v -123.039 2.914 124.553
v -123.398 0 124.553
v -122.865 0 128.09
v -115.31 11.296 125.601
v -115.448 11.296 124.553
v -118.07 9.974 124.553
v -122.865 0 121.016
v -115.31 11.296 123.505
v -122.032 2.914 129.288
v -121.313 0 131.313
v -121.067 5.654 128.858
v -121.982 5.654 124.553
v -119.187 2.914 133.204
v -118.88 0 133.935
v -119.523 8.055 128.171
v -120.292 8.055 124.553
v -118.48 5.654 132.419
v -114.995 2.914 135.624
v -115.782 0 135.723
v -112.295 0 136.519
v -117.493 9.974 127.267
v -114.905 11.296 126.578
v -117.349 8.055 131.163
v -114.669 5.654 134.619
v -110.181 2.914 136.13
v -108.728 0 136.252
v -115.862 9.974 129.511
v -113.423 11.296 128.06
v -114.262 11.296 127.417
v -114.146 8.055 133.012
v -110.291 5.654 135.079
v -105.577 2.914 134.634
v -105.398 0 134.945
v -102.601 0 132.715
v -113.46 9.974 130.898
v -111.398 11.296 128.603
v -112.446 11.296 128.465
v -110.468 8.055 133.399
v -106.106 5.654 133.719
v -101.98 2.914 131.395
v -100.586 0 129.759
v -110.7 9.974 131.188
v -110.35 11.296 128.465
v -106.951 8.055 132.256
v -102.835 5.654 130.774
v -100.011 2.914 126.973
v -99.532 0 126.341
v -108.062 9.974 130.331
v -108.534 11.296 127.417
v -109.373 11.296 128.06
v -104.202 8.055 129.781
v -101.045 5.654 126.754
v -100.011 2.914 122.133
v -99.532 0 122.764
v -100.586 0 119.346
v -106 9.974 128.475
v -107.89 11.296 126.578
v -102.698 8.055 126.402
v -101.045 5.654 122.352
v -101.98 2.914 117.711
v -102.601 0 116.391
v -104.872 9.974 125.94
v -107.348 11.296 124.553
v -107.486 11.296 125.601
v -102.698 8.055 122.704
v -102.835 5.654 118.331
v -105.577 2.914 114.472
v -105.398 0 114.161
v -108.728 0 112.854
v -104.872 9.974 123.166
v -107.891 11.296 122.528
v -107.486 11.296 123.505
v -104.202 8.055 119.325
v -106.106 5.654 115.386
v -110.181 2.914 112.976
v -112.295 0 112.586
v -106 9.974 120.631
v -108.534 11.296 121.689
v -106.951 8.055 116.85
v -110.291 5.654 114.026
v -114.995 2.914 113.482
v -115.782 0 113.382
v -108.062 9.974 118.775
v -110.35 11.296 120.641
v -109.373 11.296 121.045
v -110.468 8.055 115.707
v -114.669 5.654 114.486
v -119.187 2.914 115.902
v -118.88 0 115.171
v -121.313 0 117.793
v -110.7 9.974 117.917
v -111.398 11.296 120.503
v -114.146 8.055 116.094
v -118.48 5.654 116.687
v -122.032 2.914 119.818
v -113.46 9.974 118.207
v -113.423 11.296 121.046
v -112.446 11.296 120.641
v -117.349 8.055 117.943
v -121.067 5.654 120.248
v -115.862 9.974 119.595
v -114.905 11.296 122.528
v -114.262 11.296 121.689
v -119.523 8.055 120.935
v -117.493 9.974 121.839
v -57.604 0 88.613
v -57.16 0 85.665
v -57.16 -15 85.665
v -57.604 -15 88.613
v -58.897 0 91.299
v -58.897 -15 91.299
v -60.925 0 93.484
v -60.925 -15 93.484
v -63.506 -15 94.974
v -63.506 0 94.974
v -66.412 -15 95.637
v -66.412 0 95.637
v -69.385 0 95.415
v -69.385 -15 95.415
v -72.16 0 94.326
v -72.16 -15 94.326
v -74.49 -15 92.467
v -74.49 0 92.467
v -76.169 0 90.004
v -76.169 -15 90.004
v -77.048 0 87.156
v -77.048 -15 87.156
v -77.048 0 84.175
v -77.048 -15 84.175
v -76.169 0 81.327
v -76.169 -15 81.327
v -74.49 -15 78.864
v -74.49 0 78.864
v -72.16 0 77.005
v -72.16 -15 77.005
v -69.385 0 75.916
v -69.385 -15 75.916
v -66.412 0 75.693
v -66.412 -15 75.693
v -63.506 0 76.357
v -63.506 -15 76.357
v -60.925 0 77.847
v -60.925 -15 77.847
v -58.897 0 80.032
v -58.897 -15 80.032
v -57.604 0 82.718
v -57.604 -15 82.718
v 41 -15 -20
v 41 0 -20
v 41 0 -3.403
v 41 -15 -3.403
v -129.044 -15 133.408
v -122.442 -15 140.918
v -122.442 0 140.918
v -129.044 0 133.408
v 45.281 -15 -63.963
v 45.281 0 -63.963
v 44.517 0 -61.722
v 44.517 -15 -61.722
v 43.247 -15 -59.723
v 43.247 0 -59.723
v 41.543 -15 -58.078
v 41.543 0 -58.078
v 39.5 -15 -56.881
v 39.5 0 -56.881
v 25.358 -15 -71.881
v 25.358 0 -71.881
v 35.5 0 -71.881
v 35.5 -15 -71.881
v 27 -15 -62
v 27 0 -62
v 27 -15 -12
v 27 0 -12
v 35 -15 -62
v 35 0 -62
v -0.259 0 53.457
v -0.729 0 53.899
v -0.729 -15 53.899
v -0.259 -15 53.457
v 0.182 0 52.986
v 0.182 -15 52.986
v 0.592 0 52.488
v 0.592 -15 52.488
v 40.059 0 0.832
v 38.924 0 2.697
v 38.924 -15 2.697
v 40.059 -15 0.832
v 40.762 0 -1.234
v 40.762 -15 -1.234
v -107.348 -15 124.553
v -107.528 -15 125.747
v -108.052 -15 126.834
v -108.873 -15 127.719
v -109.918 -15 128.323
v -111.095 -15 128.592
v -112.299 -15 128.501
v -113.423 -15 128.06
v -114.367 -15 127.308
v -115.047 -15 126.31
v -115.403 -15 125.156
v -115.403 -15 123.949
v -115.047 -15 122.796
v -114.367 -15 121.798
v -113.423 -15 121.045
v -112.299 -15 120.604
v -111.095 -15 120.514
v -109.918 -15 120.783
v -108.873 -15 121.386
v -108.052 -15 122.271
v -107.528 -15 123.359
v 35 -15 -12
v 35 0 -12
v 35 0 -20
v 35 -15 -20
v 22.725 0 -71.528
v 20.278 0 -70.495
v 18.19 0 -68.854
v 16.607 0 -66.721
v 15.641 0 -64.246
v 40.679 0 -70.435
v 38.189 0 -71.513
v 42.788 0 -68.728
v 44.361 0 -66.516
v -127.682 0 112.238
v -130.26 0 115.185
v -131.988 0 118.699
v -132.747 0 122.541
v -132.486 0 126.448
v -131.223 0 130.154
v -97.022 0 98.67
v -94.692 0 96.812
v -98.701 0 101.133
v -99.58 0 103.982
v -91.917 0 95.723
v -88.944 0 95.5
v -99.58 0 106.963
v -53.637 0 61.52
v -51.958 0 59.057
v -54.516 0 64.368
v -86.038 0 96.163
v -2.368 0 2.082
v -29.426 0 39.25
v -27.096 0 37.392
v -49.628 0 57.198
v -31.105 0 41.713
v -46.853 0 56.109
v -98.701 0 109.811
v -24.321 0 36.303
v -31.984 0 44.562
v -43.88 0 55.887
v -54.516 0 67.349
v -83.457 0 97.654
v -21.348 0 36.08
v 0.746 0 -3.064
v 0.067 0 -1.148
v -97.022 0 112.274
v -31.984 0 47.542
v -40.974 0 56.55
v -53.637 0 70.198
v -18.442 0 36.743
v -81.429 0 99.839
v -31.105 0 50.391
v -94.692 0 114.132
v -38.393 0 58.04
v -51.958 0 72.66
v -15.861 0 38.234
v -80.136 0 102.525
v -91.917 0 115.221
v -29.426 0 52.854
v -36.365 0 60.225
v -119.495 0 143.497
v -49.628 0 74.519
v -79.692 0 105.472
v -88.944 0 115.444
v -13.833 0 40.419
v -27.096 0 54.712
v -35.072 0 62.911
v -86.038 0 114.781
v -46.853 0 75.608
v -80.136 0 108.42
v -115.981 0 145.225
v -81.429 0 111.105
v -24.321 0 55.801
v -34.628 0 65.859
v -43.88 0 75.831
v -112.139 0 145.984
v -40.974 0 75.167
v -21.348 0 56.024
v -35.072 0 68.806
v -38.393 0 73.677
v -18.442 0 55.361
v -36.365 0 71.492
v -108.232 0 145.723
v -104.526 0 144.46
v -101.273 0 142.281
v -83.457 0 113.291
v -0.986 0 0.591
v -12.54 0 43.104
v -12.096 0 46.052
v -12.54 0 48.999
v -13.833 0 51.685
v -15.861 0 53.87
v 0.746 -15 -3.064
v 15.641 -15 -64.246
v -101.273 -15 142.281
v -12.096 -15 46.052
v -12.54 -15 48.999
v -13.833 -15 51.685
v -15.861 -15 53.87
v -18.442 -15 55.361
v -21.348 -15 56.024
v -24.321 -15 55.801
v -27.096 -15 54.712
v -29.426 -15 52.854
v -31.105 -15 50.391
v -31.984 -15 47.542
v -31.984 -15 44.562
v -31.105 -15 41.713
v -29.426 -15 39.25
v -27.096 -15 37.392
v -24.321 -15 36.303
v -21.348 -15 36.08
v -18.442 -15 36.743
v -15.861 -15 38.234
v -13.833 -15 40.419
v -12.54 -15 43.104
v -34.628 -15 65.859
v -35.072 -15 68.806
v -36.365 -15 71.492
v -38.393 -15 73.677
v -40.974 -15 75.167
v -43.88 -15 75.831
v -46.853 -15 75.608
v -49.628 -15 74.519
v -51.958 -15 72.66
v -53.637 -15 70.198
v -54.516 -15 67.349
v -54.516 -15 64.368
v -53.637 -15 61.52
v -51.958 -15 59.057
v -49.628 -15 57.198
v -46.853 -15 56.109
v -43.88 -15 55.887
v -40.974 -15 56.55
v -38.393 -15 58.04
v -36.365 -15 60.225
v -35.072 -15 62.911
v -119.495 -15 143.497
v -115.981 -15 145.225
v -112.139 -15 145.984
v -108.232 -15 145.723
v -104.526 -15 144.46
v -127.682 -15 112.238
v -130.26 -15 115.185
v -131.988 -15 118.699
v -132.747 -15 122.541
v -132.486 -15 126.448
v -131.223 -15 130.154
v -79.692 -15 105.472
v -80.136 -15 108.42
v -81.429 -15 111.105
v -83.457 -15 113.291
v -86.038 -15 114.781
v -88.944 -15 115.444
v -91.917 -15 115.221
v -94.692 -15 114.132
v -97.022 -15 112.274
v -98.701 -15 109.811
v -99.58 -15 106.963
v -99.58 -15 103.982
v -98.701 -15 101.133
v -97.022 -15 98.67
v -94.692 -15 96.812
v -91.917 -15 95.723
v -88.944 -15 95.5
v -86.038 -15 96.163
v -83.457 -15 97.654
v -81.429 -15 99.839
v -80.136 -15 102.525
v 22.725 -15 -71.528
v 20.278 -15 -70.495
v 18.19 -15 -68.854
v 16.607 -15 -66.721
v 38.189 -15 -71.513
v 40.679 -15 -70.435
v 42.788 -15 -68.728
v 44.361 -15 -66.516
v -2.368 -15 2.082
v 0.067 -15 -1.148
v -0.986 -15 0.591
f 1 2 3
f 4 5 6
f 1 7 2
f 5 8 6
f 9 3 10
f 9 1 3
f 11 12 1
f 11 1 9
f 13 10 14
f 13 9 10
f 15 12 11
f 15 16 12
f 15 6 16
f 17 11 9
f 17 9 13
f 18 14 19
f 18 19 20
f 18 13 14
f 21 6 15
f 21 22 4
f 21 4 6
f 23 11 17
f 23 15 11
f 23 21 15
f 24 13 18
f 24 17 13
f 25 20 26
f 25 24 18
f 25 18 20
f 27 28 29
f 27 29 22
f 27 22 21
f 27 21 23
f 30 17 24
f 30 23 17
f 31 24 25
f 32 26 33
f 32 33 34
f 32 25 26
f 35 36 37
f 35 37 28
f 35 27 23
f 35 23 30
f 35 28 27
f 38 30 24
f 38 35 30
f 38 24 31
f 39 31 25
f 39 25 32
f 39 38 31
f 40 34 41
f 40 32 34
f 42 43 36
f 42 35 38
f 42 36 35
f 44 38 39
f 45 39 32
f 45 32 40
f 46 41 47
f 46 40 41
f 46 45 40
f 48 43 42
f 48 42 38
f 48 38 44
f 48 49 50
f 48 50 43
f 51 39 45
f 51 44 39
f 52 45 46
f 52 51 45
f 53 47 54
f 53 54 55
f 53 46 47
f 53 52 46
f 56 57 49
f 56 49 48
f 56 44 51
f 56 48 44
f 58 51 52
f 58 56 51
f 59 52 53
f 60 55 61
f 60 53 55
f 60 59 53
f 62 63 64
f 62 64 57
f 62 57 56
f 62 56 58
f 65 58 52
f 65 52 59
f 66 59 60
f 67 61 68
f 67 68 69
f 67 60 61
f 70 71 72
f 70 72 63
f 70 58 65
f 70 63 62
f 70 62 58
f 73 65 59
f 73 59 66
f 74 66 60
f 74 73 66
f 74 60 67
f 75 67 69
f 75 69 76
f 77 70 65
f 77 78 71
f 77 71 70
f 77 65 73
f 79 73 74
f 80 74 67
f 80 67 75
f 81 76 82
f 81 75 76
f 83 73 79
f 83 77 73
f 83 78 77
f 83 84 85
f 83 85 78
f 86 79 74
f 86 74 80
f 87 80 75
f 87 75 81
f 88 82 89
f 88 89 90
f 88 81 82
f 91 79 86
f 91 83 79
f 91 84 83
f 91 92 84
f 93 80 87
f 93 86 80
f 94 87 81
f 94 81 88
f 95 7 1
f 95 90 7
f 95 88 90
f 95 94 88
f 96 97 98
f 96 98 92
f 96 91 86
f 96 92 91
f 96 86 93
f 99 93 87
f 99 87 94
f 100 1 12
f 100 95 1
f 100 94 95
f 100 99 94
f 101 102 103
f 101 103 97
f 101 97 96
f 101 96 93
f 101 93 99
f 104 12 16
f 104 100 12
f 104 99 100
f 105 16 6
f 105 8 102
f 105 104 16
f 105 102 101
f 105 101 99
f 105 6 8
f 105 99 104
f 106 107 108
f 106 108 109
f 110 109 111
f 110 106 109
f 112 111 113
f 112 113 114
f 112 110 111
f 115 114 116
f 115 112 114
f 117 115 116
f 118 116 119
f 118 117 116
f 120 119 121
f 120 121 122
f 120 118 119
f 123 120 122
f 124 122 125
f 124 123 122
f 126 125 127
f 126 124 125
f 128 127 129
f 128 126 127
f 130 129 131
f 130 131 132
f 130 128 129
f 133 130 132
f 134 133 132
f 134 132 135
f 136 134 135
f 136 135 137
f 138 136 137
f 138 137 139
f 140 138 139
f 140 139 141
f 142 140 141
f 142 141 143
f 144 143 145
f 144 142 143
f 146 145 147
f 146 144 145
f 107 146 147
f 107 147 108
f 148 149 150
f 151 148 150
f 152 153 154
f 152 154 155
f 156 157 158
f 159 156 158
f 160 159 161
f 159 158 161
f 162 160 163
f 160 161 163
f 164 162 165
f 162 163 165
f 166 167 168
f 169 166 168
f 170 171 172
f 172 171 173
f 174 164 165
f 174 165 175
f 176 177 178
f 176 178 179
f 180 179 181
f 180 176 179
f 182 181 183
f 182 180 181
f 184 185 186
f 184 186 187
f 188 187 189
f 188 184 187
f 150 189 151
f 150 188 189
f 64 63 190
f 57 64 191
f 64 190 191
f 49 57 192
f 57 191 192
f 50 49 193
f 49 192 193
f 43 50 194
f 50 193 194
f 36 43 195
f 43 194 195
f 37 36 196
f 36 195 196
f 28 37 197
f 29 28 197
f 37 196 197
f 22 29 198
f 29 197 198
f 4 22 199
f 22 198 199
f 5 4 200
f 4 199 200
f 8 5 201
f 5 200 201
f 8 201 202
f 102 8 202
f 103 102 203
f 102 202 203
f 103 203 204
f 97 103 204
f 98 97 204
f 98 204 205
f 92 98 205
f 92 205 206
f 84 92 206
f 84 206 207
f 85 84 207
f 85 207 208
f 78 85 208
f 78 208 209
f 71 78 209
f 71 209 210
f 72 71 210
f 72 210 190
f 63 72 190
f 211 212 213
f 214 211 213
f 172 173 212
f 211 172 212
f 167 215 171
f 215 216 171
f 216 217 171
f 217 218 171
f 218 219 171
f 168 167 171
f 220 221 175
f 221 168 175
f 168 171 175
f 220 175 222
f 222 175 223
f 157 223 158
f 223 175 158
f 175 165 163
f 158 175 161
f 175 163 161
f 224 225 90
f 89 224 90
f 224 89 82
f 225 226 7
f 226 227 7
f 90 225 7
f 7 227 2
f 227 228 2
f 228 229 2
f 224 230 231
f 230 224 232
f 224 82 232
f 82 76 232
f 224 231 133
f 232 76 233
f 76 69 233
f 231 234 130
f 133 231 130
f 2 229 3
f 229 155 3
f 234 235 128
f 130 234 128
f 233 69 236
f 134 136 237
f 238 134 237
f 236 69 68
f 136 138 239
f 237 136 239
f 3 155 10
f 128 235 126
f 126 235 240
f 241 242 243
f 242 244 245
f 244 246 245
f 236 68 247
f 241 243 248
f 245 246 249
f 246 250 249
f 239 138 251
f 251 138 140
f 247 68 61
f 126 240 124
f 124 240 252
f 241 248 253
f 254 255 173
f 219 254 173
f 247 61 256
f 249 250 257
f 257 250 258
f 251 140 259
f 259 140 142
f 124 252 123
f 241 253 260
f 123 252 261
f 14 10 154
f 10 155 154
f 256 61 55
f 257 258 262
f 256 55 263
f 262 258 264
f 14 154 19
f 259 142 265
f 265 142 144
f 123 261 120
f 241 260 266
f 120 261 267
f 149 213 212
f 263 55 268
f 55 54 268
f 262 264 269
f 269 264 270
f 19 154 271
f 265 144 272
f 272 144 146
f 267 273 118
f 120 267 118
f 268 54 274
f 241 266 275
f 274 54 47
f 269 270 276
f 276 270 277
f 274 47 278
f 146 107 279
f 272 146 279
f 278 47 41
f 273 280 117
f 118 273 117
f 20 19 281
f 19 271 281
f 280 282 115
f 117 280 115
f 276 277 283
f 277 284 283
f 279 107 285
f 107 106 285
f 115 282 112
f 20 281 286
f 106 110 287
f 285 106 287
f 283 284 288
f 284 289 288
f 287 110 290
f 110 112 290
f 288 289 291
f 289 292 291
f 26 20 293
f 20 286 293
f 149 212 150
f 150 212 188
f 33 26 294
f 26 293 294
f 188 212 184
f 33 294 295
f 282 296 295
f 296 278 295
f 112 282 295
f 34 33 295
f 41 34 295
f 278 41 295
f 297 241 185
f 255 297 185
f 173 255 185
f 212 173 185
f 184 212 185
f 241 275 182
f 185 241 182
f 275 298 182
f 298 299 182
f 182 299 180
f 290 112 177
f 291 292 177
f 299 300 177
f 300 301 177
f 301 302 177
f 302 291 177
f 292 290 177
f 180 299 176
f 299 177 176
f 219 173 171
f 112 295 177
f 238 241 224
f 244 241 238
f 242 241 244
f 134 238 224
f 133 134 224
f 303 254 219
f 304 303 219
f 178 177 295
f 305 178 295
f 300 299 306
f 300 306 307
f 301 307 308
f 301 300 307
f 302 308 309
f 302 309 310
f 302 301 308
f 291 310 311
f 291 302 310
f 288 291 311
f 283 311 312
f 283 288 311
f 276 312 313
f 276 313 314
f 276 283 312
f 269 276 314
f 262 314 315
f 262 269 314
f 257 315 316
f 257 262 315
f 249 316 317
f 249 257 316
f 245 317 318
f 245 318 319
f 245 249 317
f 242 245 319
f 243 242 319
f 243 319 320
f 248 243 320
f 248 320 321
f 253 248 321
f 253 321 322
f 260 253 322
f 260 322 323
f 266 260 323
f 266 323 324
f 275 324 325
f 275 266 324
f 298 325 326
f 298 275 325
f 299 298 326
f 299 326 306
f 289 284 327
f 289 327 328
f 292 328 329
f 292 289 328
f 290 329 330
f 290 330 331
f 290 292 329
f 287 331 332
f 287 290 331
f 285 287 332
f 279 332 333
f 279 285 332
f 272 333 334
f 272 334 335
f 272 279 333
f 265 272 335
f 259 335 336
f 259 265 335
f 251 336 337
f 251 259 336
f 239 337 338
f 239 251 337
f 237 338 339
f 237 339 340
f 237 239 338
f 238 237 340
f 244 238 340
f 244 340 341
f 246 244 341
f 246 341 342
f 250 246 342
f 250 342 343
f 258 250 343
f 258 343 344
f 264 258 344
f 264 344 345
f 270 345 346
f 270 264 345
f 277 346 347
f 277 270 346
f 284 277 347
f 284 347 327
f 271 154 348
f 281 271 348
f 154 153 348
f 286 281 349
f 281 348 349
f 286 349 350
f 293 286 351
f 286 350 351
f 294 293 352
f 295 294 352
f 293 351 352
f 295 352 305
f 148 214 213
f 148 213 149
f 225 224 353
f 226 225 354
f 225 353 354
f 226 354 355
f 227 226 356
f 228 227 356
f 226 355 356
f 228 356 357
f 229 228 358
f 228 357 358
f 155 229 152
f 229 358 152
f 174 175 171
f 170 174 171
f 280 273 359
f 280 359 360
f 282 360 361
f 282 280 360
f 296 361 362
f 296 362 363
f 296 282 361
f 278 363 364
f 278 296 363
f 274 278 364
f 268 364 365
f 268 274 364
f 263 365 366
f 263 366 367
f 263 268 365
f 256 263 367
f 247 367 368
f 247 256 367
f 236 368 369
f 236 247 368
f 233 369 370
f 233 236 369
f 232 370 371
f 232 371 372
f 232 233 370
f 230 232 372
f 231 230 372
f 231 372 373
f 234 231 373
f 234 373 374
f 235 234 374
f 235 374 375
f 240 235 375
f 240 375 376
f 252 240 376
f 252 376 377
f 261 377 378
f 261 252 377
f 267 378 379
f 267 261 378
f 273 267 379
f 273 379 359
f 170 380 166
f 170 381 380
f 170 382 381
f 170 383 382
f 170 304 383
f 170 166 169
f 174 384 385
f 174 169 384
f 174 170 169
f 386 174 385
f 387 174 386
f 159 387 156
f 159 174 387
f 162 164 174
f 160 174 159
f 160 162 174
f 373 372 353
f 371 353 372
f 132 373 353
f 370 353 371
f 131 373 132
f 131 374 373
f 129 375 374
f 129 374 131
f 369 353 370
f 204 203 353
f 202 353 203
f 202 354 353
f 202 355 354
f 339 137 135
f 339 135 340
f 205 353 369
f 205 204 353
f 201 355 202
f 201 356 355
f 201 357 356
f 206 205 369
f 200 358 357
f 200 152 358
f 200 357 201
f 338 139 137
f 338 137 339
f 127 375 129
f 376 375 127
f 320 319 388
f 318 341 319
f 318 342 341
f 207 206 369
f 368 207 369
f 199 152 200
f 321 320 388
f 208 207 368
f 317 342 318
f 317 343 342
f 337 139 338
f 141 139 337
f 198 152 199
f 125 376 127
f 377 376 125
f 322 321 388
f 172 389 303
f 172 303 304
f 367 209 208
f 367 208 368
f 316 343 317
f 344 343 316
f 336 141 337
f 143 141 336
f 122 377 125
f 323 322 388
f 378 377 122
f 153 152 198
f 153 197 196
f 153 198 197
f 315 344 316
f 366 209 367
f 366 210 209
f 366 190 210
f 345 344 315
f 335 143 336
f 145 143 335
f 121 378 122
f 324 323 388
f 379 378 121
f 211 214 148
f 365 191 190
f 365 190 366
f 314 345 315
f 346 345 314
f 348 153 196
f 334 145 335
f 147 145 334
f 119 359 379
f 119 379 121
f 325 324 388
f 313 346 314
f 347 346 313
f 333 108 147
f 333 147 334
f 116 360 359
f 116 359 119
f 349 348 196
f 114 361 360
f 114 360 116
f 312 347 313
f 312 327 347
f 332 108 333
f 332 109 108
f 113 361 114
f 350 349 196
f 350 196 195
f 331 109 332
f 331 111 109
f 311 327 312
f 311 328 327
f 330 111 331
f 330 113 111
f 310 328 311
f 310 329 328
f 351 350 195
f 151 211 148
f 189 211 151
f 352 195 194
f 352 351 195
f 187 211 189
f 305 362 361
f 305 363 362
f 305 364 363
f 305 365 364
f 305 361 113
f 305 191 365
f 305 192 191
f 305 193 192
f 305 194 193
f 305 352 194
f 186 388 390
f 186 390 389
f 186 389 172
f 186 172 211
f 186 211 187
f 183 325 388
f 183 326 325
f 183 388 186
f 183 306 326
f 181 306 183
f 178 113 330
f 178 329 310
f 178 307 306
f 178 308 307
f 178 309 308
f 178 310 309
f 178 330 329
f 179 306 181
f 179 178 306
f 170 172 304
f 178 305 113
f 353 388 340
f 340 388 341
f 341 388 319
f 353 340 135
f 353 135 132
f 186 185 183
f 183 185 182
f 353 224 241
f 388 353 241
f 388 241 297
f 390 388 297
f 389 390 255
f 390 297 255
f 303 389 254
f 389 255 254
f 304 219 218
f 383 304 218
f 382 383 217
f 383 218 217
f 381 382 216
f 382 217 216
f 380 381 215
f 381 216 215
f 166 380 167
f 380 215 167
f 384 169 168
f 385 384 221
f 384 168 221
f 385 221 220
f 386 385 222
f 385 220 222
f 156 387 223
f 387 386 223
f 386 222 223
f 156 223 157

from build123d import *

# Parameters (mm, degrees)
F0_R         = 10
F1_DEPTH     = 15
F2_R         = 15
F3_T1_DEPTH  = 32.0168478214
F3_T3_DEPTH  = 19.855092474
F3_T5_DEPTH  = 60.8257569496
F3_T7_DEPTH  = 65
F3_T9_DEPTH  = 54.2875458035
F3_T11_DEPTH = 15
F5_R         = 12
F6_DEPTH     = 12
F7_R         = 11.99999
F8_R         = 4.05
F9_DEPTH     = 27.001


# Not quite as in the source:
# - a fillet or chamfer that OpenCascade refuses, or shapes differently, is made with other operations: its cross-section is extruded or revolved along the edge and cut away or added
# - a fillet or chamfer is up to 0.001 mm smaller than in the source, because OpenCascade refuses the exact size


with BuildPart() as f1:
    # F0 (on Front) → F1 (new body)
    with BuildSketch(Plane.XZ):
        Polygon((-138.9475274131, 122.1416580278), (0, 0), (17.5, -71.8808303125), (45.5, -71.8808303125), (45.5, -56.8808303125), (39.5, -56.8808303125), (35, -62), (27, -62), (27, -12), (35, -12), (35, -20), (41, -20), (41, 0), (0, 53.2575148171), (-112.5385202719, 152.1843666577), align=None)
        with Locations((-67.1597420143, 85.6654484175)):
            Circle(F0_R, mode=Mode.SUBTRACT)
        with Locations((-89.6917734867, 105.4722037734)):
            Circle(F0_R, mode=Mode.SUBTRACT)
        with Locations((-44.6277105419, 65.8586930616)):
            Circle(F0_R, mode=Mode.SUBTRACT)
        with Locations((-22.0956790695, 46.0519377058)):
            Circle(F0_R, mode=Mode.SUBTRACT)
    extrude(amount=F1_DEPTH)

    # F2
    f2_edges = [f1.edges().sort_by_distance(p)[0] for p in [
        (-112.53852, -7.5, 152.184367),
        (-138.947527, -7.5, 122.141658),
    ]]
    fillet(f2_edges, radius=F2_R)

    # F3: fillet of radius 10 on 6 edges, made by hand

    # F3_s2 → F3_t1 (cut)
    with BuildSketch(Plane.XZ.offset(-8.5084239107)):
        with BuildLine():
            ThreePointArc((38.9238894384, 2.6967924145), (40.4667548395, -0.1814830349), (41, -3.4033695643))
            Line((41, -3.4033695643), (41.2, -3.4033695643))
            Line((41.2, -3.4033695643), (41.2, 0.0680673913))
            Line((41.2, 0.0680673913), (39.0823672272, 2.8187956541))
            Line((39.0823672272, 2.8187956541), (38.9238894384, 2.6967924145))
        make_face()
    extrude(amount=F3_T1_DEPTH, mode=Mode.SUBTRACT)

    # F3_s4 → F3_t3 (cut)
    with BuildSketch(Plane.XZ.offset(-2.427546237)):
        with BuildLine():
            ThreePointArc((-0.7293006428, 53.8986056762), (-0.0343212423, 53.2253561798), (0.5923370103, 52.4880904975))
            Line((0.5923370103, 52.4880904975), (0.750814799, 52.6100937371))
            Line((0.750814799, 52.6100937371), (0.1466310486, 53.3949065431))
            Line((0.1466310486, 53.3949065431), (-0.5972556071, 54.0488192193))
            Line((-0.5972556071, 54.0488192193), (-0.7293006428, 53.8986056762))
        make_face()
    extrude(amount=F3_T3_DEPTH, mode=Mode.SUBTRACT)

    # F3_s6 → F3_t5 (cut)
    with BuildSketch(Plane.XZ.offset(-22.9128784748)):
        with BuildLine():
            ThreePointArc((45.5, -66.0459817024), (43.8666002653, -60.5687561273), (39.5, -56.8808303125))
            Line((39.5, -56.8808303125), (39.58, -56.6975272847))
            ThreePointArc((39.58, -56.6975272847), (42.5, -56.6808303125), (45.5, -56.6808303125))
            Line((45.5, -56.6808303125), (45.7, -56.8808303125))
            Line((45.7, -56.8808303125), (45.7, -66.0459817024))
            Line((45.7, -66.0459817024), (45.5, -66.0459817024))
        make_face()
    extrude(amount=F3_T5_DEPTH, mode=Mode.SUBTRACT)

    # F3_s8 → F3_t7 (cut)
    with BuildSketch(Plane.XZ.offset(-25)):
        with BuildLine():
            ThreePointArc((35.5, -71.8808303125), (42.5710678119, -68.9518981244), (45.5, -61.8808303125))
            Line((45.5, -61.8808303125), (45.7, -61.8808303125))
            Line((45.7, -61.8808303125), (45.7, -72.0808303125))
            Line((45.7, -72.0808303125), (35.5, -72.0808303125))
            Line((35.5, -72.0808303125), (35.5, -71.8808303125))
        make_face()
    extrude(amount=F3_T7_DEPTH, mode=Mode.SUBTRACT)

    # F3_s10 → F3_t9 (cut)
    with BuildSketch(Plane.XZ.offset(-19.6437729018)):
        with BuildLine():
            ThreePointArc((15.6413136753, -64.2463208091), (19.1791155574, -69.7438737743), (25.3575091607, -71.8808303125))
            Line((25.3575091607, -71.8808303125), (25.3575091607, -72.0808303125))
            Line((25.3575091607, -72.0808303125), (17.3428498168, -72.0808303125))
            Line((17.3428498168, -72.0808303125), (15.4469897656, -64.2936306191))
            Line((15.4469897656, -64.2936306191), (15.6413136753, -64.2463208091))
        make_face()
    extrude(amount=F3_T9_DEPTH, mode=Mode.SUBTRACT)

    # F3_s12 → F3_t11 (join)
    with BuildSketch(Plane.XZ):
        with BuildLine():
            ThreePointArc((-2.3681074114, 2.0816819918), (-0.4151755765, -0.2512704506), (0.7458362887, -3.0635046691))
            Line((0.7458362887, -3.0635046691), (0.9401601984, -3.0161948591))
            Line((0.9401601984, -3.0161948591), (0.1794071839, 0.1085799033))
            Line((0.1794071839, 0.1085799033), (-2.2360623757, 2.2318955349))
            Line((-2.2360623757, 2.2318955349), (-2.3681074114, 2.0816819918))
        make_face()
    extrude(amount=F3_T11_DEPTH)

    # F5 (on face) → F6 (join)
    with BuildSketch(Plane(origin=(0, 0, 0), x_dir=(-1, 0, 0), z_dir=(0, 1, 0))):
        with Locations((111.3978201201, 124.552878143)):
            Circle(F5_R)
    extrude(amount=F6_DEPTH)

    # F7 (radius 12 in the source; OpenCascade refuses exactly that, so slightly less here)
    f7_edges = [f1.edges().sort_by_distance(p)[0] for p in [
        (-99.39782, 12, 124.552878),
    ]]
    fillet(f7_edges, radius=F7_R)

    # F8 (on face) → F9 (cut, through all)
    with BuildSketch(Plane.XZ.offset(15)):
        with Locations((-111.3978201201, 124.552878143)):
            Circle(F8_R)
    extrude(amount=-F9_DEPTH, mode=Mode.SUBTRACT)


solid = f1.part
